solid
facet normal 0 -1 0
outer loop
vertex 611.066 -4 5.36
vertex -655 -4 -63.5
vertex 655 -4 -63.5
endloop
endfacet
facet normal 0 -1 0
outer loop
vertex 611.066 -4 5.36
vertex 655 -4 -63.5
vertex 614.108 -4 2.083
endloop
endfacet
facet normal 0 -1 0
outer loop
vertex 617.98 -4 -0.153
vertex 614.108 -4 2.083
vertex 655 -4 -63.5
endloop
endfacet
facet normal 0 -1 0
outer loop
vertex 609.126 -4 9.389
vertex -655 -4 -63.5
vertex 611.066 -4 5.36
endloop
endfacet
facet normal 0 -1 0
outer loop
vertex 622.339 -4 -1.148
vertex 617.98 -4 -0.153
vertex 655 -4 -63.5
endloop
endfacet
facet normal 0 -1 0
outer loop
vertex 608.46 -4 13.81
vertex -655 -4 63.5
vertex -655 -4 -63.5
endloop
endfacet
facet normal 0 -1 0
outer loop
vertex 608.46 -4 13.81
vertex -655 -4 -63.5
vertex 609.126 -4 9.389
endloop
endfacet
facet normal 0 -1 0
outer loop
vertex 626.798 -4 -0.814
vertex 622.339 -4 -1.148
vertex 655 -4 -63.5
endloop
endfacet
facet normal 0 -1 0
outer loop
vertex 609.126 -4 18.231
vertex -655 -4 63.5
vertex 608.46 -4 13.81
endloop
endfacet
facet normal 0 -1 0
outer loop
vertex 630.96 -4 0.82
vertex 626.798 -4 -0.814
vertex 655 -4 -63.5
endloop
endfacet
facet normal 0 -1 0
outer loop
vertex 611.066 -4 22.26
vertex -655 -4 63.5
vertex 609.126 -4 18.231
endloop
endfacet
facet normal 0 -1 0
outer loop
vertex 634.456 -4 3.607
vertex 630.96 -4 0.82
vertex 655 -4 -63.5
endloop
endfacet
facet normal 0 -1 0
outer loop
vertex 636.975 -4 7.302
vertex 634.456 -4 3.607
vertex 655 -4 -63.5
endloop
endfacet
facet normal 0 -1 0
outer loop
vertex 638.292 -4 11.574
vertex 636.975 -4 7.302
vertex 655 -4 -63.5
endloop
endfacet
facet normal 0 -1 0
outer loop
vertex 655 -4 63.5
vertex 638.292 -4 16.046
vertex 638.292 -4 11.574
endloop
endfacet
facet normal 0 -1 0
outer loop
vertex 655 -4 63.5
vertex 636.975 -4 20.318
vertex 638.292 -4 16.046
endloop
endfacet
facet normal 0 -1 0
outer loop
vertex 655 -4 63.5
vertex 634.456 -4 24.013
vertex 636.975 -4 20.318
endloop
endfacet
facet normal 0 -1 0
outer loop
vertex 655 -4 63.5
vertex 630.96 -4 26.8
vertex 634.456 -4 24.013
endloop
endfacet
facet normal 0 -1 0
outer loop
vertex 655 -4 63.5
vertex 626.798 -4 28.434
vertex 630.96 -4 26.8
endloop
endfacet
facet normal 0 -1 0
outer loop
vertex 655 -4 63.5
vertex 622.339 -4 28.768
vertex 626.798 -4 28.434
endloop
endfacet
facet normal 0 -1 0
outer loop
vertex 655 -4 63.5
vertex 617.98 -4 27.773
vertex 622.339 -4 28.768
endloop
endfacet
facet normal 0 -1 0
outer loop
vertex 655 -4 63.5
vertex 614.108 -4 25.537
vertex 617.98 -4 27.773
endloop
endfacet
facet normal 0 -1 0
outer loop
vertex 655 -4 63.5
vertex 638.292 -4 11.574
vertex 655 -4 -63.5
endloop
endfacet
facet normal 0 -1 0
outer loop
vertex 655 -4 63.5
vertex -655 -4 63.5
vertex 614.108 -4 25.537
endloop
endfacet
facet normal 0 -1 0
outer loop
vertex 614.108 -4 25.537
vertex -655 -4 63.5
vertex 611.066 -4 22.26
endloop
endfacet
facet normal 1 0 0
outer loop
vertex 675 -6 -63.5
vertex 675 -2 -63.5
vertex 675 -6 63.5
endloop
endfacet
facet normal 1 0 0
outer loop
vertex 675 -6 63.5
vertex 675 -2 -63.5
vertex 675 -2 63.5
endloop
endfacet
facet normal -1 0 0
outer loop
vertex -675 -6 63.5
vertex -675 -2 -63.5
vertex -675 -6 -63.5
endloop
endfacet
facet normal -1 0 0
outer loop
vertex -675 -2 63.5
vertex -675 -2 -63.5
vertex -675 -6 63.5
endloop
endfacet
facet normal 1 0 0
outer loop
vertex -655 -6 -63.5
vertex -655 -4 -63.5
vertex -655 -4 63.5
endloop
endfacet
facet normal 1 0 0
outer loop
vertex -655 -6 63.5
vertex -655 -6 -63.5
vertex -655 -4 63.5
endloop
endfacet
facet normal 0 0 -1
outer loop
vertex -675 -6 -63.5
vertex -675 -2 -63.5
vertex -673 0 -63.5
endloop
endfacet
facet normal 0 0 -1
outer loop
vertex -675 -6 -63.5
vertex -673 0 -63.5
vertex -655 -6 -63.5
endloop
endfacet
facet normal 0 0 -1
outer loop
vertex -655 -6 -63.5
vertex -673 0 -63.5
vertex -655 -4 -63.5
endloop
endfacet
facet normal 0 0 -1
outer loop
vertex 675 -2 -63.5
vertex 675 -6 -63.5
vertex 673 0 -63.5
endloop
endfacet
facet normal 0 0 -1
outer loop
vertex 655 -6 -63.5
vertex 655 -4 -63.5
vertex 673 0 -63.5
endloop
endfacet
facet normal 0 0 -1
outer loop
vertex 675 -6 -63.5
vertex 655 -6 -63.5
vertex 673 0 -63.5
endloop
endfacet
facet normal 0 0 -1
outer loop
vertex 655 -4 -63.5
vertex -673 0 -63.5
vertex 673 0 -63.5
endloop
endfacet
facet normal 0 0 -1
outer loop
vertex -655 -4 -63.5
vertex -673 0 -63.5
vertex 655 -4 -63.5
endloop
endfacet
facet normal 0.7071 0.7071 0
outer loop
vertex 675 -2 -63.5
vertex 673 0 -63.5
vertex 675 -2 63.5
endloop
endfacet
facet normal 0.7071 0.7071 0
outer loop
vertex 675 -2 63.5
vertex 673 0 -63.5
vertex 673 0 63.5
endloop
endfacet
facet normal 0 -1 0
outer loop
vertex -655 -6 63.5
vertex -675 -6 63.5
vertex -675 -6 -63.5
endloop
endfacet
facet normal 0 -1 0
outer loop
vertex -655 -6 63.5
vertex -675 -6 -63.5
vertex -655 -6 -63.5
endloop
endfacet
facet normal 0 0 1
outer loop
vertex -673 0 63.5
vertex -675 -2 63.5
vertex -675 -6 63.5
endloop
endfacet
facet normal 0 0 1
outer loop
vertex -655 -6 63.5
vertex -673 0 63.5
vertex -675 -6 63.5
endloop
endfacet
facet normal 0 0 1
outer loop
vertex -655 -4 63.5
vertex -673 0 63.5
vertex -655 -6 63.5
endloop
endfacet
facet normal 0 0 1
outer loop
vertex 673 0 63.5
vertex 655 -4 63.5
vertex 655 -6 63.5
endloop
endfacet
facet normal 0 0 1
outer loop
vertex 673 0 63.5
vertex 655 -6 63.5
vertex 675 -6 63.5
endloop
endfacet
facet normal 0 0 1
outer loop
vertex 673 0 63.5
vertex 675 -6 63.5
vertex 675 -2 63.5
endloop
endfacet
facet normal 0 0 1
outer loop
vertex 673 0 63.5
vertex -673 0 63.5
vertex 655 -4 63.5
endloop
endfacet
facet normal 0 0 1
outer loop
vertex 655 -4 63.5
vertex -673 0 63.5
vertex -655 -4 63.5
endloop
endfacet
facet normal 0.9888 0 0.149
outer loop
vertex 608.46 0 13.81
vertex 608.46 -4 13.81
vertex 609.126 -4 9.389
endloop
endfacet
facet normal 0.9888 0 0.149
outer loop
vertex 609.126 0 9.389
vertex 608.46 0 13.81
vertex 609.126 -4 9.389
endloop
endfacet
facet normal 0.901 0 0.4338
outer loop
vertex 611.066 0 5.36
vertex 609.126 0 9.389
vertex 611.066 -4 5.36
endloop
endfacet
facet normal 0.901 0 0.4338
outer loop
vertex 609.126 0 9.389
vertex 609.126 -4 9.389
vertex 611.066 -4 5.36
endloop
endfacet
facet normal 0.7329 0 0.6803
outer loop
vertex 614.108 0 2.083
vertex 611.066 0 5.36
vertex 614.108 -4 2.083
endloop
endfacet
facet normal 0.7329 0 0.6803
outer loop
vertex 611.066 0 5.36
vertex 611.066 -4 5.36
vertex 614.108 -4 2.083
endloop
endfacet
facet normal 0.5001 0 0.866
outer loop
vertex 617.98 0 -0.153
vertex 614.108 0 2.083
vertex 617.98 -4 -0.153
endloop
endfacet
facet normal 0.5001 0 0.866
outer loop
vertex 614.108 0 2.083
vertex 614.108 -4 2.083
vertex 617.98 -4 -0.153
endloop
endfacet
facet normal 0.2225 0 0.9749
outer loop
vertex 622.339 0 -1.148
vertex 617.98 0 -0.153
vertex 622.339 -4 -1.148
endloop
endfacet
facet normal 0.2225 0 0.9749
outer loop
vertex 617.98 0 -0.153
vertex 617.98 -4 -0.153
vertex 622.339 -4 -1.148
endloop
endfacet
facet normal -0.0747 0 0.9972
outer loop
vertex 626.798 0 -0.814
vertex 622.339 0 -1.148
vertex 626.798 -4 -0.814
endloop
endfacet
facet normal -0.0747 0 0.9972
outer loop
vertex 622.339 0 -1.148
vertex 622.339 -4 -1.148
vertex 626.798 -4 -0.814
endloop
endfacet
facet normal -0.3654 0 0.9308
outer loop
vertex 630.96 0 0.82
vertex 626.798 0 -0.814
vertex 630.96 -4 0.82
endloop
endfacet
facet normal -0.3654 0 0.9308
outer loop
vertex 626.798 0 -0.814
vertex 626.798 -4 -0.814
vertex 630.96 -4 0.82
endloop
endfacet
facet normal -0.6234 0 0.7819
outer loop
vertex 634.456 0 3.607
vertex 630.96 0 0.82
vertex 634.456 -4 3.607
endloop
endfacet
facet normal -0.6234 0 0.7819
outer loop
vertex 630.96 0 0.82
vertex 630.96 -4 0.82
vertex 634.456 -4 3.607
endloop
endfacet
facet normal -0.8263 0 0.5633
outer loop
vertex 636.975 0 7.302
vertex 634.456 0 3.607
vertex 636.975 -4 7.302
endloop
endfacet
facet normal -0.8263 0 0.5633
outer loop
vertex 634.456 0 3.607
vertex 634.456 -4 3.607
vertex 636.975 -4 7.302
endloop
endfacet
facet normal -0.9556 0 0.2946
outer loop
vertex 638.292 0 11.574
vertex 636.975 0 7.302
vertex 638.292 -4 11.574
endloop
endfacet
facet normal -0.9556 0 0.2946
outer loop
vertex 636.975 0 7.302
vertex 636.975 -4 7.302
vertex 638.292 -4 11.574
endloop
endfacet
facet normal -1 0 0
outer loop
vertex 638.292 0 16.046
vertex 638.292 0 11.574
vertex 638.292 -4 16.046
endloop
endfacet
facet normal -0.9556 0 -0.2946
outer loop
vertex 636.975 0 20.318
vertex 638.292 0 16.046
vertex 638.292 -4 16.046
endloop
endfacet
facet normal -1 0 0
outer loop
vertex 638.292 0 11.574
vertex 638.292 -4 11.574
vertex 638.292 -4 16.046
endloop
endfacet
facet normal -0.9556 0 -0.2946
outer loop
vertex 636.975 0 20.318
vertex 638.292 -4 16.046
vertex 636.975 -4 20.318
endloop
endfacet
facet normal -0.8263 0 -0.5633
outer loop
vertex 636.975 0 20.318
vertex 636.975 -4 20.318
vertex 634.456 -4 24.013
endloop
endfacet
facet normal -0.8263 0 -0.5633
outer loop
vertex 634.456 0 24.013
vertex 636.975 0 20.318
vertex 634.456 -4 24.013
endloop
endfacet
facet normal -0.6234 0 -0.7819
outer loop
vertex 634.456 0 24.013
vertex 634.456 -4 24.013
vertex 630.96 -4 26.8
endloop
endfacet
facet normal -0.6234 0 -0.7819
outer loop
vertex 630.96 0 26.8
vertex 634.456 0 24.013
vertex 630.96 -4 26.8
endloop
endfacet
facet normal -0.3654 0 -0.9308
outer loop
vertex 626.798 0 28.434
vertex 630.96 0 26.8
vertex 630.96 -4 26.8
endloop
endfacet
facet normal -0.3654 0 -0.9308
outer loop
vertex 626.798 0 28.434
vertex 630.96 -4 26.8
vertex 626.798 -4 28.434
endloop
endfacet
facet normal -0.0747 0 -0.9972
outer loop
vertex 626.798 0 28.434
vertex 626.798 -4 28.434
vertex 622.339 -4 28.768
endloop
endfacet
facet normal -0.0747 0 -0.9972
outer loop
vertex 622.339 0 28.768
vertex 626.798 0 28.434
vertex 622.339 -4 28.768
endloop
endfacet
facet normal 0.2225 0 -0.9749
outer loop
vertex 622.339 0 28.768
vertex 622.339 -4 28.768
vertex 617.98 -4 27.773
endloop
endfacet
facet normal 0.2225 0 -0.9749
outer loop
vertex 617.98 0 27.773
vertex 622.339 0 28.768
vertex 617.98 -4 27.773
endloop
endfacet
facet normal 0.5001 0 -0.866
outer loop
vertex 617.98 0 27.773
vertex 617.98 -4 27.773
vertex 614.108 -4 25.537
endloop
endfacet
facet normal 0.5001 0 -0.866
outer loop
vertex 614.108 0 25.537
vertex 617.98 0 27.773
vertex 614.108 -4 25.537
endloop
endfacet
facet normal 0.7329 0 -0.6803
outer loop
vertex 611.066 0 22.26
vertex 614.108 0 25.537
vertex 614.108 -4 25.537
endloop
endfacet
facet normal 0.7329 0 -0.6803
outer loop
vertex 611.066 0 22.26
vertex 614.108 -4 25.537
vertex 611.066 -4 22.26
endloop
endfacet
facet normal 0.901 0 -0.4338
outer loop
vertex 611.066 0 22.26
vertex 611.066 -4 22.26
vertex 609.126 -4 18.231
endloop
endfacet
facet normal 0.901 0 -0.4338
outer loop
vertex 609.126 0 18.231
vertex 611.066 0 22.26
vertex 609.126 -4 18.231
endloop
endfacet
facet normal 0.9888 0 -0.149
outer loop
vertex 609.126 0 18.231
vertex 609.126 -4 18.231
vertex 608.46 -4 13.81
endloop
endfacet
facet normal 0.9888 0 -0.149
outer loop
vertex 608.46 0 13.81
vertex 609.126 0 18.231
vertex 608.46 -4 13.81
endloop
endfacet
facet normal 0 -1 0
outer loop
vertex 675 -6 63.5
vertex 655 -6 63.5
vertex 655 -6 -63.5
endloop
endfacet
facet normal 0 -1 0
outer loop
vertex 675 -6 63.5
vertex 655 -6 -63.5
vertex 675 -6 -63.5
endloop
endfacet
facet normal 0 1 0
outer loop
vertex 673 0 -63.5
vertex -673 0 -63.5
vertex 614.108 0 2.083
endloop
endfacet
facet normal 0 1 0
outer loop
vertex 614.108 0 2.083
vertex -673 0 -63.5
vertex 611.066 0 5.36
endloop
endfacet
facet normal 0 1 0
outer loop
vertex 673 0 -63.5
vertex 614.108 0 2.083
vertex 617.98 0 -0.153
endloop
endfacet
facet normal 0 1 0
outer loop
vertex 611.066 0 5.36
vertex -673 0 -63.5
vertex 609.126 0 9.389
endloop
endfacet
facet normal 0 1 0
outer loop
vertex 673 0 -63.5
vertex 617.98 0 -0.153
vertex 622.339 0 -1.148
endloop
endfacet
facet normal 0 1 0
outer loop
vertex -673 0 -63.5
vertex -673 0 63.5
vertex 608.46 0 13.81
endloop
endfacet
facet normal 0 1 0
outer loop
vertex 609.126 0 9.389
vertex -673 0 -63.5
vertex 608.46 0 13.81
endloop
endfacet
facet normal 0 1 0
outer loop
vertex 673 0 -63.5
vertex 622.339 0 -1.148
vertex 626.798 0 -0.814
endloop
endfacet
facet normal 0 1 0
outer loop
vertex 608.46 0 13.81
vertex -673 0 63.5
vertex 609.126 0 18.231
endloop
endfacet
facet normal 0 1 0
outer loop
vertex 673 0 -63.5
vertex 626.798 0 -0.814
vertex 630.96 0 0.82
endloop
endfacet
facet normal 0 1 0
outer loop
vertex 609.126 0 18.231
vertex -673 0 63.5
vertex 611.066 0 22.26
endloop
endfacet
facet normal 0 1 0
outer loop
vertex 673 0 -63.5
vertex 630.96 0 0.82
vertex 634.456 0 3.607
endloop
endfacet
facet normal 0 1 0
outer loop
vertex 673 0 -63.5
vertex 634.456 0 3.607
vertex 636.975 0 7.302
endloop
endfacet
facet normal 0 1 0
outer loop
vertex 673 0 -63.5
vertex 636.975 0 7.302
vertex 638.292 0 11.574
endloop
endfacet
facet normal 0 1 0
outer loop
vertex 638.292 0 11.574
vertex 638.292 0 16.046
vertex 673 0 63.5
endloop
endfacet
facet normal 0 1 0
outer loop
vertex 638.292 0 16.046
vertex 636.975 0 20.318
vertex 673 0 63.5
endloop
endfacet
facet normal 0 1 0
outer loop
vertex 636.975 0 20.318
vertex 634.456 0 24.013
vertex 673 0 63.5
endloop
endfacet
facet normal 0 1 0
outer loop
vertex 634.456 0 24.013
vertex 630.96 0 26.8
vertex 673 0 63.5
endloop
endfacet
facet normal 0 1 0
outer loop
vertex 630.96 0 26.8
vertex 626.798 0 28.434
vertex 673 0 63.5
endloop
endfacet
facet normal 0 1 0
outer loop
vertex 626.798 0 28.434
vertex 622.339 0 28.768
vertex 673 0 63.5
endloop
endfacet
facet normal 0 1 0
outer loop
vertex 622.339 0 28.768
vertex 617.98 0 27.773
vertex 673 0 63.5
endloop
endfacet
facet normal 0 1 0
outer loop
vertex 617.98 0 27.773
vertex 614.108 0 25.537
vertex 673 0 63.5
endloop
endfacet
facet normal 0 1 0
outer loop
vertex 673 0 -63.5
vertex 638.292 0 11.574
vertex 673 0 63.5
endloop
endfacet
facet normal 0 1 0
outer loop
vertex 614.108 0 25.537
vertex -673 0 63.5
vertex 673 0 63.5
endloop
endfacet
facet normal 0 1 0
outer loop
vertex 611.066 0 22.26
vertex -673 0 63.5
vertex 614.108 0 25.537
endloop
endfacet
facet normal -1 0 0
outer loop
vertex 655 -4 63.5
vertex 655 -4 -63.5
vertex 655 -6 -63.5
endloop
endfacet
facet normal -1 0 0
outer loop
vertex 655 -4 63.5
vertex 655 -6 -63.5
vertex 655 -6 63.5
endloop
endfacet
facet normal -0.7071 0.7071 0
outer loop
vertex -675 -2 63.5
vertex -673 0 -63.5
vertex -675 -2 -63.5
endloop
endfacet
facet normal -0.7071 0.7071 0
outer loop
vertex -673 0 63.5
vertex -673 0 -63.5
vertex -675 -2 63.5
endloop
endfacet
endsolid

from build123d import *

# Parameters (mm, degrees)
F0_W     = 20
F0_H     = 127
F0_W_2   = 1310
F1_DEPTH = 4
F2_D     = 30
F3_W     = 20
F3_H     = 127
F4_DEPTH = 2
F5_SIZE  = 2


with BuildPart() as f1:
    # F0 (on Front) → F1 (new body)
    with BuildSketch(Plane.XZ):
        with Locations((-665, 0)):
            Rectangle(F0_W, F0_H)
        Rectangle(F0_W_2, F0_H)
        with Locations((665, 0)):
            Rectangle(F0_W, F0_H)
    extrude(amount=F1_DEPTH)

    # F2 (through all)
    with Locations(Plane(origin=(0, 0, 0), x_dir=(1, 0, 0), z_dir=(0, 1, 0))):
        with Locations((623.46, -13.81)):
            Hole(F2_D / 2)

    # F3 (on face) → F4 (join)
    with BuildSketch(Plane.XZ.offset(4)):
        with Locations((-665, 0)):
            Rectangle(F3_W, F3_H)
        with Locations((665, 0)):
            Rectangle(F3_W, F3_H)
    extrude(amount=F4_DEPTH)

    # F5
    f5_edges = [f1.edges().sort_by_distance(p)[0] for p in [
        (675, 0, 0),
        (-675, 0, 0),
    ]]
    chamfer(f5_edges, length=F5_SIZE)


solid = f1.part
